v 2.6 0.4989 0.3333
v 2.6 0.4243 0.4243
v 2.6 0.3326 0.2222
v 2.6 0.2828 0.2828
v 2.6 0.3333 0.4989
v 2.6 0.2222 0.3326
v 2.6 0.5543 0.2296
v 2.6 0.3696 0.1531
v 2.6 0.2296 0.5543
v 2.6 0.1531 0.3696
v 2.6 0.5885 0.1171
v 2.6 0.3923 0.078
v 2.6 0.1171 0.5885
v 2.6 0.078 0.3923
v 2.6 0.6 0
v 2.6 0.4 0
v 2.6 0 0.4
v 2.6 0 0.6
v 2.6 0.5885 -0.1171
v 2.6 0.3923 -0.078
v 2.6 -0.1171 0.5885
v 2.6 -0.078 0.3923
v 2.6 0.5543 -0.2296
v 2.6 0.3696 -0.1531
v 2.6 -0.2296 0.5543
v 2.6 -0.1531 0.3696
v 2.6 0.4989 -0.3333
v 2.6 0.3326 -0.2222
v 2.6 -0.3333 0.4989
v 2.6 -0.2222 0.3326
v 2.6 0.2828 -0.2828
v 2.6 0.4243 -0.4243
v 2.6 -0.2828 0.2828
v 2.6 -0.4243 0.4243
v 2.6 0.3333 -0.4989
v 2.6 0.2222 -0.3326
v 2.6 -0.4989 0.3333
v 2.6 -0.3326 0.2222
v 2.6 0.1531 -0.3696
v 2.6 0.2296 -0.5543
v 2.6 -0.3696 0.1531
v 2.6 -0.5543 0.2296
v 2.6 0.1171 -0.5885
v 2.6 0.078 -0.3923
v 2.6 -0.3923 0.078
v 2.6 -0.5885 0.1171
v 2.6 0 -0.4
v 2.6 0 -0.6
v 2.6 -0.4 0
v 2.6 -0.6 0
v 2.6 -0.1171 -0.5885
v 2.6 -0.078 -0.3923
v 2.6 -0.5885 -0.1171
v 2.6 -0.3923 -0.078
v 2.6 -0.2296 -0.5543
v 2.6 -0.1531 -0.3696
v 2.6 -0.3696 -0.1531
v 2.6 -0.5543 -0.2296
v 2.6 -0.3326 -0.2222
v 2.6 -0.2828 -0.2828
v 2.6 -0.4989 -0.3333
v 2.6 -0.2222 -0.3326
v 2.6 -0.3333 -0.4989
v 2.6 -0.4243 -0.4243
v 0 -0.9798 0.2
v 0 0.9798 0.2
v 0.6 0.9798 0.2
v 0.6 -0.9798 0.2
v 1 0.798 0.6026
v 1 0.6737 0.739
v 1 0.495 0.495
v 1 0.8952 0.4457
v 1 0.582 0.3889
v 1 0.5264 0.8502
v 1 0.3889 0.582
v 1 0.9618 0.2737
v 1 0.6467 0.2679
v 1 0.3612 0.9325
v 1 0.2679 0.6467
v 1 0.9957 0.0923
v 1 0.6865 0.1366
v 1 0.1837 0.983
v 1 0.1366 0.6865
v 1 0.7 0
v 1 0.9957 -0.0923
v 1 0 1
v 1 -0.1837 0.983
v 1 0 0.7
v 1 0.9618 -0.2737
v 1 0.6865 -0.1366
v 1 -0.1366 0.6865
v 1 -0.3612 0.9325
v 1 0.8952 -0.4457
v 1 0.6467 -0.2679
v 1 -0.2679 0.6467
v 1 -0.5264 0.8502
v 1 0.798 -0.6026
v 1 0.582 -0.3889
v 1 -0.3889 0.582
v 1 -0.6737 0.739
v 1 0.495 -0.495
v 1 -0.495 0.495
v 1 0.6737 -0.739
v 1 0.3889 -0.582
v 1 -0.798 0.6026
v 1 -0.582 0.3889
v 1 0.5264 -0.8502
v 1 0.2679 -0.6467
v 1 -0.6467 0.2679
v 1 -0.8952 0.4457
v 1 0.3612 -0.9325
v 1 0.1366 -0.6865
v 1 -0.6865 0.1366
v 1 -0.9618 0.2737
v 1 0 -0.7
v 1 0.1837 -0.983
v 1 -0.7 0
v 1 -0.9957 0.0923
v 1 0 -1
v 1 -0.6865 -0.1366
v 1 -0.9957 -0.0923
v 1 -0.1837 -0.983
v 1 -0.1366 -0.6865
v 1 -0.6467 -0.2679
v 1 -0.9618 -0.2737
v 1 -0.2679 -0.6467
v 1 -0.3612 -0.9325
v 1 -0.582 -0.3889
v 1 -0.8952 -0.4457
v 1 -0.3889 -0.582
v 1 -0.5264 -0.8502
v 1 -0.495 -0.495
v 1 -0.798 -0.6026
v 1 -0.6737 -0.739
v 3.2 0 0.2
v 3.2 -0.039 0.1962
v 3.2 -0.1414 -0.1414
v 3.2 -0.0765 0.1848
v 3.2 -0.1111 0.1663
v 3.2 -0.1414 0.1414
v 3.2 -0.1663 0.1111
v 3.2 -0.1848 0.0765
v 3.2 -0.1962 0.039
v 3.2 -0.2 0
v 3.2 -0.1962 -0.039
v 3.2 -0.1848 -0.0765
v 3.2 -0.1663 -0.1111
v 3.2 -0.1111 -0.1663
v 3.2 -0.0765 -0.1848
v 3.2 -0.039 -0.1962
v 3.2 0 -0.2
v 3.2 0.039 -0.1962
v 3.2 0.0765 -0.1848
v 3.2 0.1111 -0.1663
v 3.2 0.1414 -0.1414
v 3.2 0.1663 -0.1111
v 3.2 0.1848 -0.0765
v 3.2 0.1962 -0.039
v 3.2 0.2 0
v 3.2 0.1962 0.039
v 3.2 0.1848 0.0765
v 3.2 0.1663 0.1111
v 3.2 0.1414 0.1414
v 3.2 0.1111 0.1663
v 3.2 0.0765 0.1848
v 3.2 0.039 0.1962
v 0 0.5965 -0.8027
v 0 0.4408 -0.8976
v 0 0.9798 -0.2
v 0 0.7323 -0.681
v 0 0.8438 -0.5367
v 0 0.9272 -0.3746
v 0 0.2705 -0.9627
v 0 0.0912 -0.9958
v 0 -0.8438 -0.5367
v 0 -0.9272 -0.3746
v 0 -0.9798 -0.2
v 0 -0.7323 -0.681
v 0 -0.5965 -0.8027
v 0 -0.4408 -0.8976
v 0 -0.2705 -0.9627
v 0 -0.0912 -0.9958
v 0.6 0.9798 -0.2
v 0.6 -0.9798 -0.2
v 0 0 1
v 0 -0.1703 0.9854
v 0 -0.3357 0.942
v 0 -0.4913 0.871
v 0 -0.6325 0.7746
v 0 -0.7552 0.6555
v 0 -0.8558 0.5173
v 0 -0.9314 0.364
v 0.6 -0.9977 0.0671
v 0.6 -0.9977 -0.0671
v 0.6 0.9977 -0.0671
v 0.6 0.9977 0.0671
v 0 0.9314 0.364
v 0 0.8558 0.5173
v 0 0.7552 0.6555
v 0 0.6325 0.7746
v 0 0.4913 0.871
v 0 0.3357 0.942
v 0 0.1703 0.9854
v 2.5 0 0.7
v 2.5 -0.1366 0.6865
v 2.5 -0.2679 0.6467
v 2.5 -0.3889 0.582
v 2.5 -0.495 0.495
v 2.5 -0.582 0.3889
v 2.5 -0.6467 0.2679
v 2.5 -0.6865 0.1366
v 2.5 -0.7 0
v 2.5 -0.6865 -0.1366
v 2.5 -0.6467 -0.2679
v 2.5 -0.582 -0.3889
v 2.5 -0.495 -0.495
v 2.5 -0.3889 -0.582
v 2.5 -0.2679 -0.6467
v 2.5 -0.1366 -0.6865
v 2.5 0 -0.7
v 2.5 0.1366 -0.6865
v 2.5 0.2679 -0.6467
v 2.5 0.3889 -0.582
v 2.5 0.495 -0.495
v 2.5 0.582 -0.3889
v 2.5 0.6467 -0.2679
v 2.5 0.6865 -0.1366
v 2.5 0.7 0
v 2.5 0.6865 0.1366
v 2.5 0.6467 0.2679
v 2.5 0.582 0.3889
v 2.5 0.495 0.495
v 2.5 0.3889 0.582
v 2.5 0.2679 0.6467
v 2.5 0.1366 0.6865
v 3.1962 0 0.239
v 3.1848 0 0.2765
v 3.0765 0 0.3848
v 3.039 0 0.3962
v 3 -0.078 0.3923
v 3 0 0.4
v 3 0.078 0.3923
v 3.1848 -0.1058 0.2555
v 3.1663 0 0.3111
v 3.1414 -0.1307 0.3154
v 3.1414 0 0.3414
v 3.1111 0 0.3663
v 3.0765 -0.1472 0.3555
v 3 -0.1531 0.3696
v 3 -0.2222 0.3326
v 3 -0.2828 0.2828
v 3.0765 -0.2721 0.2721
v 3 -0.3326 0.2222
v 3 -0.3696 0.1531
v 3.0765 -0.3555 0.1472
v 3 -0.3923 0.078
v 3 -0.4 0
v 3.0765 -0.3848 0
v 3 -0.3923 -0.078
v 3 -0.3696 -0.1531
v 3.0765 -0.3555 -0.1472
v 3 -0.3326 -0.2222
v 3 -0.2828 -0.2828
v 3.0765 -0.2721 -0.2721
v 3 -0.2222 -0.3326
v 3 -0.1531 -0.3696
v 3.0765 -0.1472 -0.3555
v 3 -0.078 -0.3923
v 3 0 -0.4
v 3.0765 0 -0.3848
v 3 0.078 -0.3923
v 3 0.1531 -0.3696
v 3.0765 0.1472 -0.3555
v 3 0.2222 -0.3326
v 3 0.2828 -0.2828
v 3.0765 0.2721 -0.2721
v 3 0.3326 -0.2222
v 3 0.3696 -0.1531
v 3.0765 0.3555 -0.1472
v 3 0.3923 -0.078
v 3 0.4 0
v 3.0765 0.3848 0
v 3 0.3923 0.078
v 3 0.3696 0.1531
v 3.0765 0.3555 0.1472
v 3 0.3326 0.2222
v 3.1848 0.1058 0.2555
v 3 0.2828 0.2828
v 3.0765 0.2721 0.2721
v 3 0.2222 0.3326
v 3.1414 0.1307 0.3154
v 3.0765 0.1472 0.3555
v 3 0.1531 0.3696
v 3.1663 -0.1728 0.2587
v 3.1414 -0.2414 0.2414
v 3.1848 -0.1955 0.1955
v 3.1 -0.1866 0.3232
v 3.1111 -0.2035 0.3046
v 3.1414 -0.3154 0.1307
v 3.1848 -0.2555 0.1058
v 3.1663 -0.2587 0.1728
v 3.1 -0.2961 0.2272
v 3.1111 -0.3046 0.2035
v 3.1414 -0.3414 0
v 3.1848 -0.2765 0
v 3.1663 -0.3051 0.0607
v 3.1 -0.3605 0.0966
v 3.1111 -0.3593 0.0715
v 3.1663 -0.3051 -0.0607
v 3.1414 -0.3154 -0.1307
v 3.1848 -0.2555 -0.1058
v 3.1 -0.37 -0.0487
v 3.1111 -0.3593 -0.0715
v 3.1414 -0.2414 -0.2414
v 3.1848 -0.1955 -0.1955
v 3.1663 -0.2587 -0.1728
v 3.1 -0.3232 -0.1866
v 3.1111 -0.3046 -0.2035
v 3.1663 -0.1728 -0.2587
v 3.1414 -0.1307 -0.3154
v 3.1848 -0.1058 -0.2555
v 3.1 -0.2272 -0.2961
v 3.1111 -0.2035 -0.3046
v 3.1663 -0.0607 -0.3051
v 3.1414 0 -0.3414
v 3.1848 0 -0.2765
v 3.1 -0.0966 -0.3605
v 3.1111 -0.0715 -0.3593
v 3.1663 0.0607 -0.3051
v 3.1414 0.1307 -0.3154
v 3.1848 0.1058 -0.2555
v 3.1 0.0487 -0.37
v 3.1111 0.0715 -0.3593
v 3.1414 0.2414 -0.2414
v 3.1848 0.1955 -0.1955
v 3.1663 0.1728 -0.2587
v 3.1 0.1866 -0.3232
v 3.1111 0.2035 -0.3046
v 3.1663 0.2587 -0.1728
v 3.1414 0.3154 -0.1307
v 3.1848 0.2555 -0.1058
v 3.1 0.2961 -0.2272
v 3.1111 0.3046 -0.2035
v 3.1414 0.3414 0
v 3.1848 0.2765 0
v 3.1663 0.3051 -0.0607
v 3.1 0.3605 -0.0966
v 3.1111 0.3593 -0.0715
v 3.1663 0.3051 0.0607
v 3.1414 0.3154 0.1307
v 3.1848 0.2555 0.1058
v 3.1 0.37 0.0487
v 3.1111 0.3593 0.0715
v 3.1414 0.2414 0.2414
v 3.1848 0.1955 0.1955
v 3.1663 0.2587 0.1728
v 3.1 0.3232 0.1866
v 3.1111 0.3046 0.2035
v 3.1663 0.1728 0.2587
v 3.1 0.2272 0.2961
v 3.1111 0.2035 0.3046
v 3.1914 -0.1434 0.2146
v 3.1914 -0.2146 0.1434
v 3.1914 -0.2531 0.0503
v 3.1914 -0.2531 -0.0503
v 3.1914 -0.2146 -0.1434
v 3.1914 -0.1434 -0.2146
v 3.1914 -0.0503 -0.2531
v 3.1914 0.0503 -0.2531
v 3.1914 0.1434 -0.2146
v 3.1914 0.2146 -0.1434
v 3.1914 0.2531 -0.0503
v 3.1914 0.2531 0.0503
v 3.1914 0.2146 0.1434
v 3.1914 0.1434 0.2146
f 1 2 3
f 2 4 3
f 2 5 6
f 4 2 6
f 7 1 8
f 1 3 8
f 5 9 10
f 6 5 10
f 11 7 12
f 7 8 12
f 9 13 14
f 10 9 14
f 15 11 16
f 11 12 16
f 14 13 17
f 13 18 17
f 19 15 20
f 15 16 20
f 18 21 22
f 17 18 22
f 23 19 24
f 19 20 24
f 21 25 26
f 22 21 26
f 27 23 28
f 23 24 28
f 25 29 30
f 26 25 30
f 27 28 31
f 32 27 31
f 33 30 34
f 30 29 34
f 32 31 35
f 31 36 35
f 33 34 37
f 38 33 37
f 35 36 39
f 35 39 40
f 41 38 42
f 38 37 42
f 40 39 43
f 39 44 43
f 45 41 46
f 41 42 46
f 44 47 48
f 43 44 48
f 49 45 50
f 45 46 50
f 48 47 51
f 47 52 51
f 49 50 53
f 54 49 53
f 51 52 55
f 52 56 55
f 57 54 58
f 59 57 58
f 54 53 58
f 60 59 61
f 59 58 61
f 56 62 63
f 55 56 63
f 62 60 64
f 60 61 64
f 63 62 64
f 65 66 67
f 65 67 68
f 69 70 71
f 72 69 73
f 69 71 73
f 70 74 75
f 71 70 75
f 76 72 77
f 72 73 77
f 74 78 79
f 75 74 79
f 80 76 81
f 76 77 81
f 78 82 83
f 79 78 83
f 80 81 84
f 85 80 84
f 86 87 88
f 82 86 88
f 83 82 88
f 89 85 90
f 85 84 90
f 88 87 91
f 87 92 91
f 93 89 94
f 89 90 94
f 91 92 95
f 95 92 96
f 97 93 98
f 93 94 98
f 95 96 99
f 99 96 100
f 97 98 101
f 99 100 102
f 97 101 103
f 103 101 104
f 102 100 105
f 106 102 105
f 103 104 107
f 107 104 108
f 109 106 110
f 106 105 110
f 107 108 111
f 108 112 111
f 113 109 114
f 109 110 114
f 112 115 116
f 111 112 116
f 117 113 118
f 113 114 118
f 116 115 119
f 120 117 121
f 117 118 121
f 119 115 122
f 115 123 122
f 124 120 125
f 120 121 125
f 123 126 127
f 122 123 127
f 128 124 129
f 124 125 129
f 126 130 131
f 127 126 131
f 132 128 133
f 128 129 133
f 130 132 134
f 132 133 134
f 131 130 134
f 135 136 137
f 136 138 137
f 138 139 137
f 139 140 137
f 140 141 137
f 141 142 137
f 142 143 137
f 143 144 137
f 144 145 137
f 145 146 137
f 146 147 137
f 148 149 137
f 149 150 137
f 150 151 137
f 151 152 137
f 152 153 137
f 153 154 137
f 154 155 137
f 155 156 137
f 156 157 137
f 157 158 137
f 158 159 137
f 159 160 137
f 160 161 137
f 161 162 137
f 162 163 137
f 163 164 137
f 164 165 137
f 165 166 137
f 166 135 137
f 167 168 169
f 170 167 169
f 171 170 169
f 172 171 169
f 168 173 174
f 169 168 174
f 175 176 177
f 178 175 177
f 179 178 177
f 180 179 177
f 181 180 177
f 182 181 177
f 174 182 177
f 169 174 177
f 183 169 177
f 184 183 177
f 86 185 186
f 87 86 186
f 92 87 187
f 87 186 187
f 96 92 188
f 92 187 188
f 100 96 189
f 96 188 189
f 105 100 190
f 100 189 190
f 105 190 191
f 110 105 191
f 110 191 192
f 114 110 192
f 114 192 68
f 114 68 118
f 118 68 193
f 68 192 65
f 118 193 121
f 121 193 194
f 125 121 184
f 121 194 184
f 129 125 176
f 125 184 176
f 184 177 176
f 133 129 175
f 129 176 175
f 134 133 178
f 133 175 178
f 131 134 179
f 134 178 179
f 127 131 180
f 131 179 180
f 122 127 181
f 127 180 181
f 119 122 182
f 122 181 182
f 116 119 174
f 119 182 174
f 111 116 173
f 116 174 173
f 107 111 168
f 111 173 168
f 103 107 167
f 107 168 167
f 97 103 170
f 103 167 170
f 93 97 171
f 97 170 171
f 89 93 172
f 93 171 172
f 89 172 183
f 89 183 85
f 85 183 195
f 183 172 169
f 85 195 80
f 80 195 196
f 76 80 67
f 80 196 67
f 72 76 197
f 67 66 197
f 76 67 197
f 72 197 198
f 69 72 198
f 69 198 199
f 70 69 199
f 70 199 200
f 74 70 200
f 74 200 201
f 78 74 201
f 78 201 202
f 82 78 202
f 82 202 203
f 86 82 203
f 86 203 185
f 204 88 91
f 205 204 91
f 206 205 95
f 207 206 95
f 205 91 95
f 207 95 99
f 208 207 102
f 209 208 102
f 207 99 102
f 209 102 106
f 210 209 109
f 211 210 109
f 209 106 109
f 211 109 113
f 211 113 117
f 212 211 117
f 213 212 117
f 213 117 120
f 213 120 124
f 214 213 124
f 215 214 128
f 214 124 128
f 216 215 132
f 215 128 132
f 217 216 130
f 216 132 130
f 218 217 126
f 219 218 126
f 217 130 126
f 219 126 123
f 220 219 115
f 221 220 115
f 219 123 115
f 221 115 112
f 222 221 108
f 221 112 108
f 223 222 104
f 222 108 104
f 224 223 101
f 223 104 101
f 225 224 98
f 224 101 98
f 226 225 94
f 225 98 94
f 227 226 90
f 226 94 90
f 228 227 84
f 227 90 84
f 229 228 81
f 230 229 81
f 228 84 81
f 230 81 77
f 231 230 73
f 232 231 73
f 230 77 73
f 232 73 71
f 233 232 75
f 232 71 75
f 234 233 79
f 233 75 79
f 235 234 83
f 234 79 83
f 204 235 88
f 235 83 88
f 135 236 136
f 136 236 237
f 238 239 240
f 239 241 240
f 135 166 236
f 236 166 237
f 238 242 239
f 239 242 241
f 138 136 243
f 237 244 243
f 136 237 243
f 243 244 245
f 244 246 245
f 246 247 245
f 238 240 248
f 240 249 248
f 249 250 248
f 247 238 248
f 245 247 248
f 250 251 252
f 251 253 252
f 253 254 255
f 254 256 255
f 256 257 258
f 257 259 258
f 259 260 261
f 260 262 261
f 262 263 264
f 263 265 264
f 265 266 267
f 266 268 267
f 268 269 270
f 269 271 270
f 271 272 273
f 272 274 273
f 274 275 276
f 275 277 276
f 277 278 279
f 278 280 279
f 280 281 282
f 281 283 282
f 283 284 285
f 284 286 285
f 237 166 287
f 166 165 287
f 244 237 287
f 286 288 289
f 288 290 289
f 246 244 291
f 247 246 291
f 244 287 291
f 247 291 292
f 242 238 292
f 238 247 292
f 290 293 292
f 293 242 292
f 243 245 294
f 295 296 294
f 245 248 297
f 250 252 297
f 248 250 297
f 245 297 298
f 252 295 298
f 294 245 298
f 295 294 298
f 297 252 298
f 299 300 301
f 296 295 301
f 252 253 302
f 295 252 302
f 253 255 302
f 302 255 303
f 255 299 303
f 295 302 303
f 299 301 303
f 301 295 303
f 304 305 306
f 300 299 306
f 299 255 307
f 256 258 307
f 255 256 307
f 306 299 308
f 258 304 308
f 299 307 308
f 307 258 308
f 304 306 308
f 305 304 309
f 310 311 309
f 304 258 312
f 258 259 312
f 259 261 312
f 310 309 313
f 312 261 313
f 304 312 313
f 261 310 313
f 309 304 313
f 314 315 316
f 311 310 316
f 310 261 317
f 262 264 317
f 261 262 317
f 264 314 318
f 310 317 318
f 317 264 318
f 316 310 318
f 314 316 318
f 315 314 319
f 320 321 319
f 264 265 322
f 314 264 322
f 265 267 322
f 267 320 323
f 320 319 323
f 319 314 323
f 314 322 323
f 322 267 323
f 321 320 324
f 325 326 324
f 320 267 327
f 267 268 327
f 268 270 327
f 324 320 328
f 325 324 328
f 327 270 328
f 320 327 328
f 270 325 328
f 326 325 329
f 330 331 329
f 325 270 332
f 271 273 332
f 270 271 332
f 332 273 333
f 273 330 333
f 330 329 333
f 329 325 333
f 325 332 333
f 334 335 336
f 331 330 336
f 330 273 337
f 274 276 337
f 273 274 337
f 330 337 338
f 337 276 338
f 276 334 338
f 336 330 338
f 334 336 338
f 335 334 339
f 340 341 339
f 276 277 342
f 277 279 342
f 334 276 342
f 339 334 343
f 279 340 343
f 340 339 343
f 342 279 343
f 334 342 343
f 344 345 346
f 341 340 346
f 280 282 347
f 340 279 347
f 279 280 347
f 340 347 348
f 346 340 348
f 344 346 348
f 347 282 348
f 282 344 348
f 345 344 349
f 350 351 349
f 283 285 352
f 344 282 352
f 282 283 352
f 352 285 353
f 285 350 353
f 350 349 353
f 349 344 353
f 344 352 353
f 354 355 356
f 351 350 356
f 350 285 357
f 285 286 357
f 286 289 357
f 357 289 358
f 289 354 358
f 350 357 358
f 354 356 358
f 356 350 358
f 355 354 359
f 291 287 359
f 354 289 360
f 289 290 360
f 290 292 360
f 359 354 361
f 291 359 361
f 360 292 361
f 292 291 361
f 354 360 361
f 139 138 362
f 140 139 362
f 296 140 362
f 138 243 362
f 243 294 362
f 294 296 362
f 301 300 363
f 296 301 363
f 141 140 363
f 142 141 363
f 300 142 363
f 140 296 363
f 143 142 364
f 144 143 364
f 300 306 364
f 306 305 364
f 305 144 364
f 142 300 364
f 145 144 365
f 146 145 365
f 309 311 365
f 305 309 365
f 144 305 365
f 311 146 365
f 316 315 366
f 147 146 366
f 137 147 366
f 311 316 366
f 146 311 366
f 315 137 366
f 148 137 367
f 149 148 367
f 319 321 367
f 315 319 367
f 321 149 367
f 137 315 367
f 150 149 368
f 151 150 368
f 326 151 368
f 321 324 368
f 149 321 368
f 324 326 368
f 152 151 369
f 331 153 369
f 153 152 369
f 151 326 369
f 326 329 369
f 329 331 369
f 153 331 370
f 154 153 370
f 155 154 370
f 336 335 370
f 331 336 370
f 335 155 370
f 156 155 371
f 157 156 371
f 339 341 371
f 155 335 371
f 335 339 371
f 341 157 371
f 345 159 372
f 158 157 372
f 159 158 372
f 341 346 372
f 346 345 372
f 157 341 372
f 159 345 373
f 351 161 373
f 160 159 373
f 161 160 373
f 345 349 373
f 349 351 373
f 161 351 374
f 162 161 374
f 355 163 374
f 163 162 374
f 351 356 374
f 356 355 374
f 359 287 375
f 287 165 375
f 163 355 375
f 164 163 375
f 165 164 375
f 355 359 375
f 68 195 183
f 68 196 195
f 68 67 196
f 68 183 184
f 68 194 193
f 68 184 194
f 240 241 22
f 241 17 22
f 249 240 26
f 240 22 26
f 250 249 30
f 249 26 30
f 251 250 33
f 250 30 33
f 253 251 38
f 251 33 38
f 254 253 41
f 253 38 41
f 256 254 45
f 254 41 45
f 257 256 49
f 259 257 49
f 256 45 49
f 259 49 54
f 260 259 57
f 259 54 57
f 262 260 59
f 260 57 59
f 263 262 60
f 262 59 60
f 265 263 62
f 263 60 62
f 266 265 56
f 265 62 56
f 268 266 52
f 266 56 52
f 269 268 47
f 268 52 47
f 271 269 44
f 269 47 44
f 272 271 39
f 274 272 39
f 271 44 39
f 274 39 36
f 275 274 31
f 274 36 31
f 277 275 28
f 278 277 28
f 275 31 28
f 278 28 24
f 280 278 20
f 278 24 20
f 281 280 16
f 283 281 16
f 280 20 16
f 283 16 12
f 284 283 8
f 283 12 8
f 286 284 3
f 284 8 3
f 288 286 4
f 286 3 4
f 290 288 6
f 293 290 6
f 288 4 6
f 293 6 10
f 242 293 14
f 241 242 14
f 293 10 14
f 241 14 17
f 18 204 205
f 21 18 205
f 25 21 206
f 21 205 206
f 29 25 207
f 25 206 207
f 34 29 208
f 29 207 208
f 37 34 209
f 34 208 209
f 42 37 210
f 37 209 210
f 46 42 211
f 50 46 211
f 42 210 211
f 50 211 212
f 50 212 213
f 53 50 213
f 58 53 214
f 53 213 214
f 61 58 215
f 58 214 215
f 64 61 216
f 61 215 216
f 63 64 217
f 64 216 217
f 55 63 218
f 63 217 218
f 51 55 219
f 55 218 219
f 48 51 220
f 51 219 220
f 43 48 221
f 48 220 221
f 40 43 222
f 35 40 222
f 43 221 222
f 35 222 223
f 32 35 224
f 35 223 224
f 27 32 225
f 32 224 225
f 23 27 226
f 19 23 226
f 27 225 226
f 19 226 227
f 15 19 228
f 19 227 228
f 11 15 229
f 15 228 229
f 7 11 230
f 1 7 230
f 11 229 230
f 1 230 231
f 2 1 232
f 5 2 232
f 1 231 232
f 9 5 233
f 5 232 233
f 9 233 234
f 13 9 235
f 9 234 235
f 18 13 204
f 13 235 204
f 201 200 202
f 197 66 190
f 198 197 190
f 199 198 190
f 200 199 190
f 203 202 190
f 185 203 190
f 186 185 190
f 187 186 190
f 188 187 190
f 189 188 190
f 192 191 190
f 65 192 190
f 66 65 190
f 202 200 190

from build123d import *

# Parameters (mm, degrees)
F2_SIZE  = 0.1
F3_W     = 2
F3_H     = 0.4
F4_DEPTH = 0.6


with BuildPart() as f1:
    # F0 (on Front) → F1 (revolve)
    with BuildSketch(Plane.XZ):
        Polygon((1, 1), (0, 1), (0, 0), (1, 0), (1, 0.7), align=None)
        Polygon((2.6, 0.7), (1, 0.7), (1, 0), (2.6, 0), (2.6, 0.4), align=None)
        with BuildLine():
            Line((2.6, 0.4), (2.6, 0))
            Line((2.6, 0), (3.2, 0))
            Line((3.2, 0), (3.2, 0.2))
            ThreePointArc((3.2, 0.2), (3.141421, 0.341421), (3, 0.4))
            Line((3, 0.4), (2.6, 0.4))
        make_face()
    revolve(axis=Axis((1.6, 0, 0), (1, 0, 0)))

    # F2
    f2_edges = [f1.edges().sort_by_distance(p)[0] for p in [
        (2.6, 0, -0.7),
    ]]
    chamfer(f2_edges, length=F2_SIZE)

    # F3 (on face) → F4 (cut)
    with BuildSketch(Plane(origin=(0, 0, 0), x_dir=(0, -1, 0), z_dir=(-1, 0, 0))):
        Rectangle(F3_W, F3_H)
    extrude(amount=-F4_DEPTH, mode=Mode.SUBTRACT)


solid = f1.part
